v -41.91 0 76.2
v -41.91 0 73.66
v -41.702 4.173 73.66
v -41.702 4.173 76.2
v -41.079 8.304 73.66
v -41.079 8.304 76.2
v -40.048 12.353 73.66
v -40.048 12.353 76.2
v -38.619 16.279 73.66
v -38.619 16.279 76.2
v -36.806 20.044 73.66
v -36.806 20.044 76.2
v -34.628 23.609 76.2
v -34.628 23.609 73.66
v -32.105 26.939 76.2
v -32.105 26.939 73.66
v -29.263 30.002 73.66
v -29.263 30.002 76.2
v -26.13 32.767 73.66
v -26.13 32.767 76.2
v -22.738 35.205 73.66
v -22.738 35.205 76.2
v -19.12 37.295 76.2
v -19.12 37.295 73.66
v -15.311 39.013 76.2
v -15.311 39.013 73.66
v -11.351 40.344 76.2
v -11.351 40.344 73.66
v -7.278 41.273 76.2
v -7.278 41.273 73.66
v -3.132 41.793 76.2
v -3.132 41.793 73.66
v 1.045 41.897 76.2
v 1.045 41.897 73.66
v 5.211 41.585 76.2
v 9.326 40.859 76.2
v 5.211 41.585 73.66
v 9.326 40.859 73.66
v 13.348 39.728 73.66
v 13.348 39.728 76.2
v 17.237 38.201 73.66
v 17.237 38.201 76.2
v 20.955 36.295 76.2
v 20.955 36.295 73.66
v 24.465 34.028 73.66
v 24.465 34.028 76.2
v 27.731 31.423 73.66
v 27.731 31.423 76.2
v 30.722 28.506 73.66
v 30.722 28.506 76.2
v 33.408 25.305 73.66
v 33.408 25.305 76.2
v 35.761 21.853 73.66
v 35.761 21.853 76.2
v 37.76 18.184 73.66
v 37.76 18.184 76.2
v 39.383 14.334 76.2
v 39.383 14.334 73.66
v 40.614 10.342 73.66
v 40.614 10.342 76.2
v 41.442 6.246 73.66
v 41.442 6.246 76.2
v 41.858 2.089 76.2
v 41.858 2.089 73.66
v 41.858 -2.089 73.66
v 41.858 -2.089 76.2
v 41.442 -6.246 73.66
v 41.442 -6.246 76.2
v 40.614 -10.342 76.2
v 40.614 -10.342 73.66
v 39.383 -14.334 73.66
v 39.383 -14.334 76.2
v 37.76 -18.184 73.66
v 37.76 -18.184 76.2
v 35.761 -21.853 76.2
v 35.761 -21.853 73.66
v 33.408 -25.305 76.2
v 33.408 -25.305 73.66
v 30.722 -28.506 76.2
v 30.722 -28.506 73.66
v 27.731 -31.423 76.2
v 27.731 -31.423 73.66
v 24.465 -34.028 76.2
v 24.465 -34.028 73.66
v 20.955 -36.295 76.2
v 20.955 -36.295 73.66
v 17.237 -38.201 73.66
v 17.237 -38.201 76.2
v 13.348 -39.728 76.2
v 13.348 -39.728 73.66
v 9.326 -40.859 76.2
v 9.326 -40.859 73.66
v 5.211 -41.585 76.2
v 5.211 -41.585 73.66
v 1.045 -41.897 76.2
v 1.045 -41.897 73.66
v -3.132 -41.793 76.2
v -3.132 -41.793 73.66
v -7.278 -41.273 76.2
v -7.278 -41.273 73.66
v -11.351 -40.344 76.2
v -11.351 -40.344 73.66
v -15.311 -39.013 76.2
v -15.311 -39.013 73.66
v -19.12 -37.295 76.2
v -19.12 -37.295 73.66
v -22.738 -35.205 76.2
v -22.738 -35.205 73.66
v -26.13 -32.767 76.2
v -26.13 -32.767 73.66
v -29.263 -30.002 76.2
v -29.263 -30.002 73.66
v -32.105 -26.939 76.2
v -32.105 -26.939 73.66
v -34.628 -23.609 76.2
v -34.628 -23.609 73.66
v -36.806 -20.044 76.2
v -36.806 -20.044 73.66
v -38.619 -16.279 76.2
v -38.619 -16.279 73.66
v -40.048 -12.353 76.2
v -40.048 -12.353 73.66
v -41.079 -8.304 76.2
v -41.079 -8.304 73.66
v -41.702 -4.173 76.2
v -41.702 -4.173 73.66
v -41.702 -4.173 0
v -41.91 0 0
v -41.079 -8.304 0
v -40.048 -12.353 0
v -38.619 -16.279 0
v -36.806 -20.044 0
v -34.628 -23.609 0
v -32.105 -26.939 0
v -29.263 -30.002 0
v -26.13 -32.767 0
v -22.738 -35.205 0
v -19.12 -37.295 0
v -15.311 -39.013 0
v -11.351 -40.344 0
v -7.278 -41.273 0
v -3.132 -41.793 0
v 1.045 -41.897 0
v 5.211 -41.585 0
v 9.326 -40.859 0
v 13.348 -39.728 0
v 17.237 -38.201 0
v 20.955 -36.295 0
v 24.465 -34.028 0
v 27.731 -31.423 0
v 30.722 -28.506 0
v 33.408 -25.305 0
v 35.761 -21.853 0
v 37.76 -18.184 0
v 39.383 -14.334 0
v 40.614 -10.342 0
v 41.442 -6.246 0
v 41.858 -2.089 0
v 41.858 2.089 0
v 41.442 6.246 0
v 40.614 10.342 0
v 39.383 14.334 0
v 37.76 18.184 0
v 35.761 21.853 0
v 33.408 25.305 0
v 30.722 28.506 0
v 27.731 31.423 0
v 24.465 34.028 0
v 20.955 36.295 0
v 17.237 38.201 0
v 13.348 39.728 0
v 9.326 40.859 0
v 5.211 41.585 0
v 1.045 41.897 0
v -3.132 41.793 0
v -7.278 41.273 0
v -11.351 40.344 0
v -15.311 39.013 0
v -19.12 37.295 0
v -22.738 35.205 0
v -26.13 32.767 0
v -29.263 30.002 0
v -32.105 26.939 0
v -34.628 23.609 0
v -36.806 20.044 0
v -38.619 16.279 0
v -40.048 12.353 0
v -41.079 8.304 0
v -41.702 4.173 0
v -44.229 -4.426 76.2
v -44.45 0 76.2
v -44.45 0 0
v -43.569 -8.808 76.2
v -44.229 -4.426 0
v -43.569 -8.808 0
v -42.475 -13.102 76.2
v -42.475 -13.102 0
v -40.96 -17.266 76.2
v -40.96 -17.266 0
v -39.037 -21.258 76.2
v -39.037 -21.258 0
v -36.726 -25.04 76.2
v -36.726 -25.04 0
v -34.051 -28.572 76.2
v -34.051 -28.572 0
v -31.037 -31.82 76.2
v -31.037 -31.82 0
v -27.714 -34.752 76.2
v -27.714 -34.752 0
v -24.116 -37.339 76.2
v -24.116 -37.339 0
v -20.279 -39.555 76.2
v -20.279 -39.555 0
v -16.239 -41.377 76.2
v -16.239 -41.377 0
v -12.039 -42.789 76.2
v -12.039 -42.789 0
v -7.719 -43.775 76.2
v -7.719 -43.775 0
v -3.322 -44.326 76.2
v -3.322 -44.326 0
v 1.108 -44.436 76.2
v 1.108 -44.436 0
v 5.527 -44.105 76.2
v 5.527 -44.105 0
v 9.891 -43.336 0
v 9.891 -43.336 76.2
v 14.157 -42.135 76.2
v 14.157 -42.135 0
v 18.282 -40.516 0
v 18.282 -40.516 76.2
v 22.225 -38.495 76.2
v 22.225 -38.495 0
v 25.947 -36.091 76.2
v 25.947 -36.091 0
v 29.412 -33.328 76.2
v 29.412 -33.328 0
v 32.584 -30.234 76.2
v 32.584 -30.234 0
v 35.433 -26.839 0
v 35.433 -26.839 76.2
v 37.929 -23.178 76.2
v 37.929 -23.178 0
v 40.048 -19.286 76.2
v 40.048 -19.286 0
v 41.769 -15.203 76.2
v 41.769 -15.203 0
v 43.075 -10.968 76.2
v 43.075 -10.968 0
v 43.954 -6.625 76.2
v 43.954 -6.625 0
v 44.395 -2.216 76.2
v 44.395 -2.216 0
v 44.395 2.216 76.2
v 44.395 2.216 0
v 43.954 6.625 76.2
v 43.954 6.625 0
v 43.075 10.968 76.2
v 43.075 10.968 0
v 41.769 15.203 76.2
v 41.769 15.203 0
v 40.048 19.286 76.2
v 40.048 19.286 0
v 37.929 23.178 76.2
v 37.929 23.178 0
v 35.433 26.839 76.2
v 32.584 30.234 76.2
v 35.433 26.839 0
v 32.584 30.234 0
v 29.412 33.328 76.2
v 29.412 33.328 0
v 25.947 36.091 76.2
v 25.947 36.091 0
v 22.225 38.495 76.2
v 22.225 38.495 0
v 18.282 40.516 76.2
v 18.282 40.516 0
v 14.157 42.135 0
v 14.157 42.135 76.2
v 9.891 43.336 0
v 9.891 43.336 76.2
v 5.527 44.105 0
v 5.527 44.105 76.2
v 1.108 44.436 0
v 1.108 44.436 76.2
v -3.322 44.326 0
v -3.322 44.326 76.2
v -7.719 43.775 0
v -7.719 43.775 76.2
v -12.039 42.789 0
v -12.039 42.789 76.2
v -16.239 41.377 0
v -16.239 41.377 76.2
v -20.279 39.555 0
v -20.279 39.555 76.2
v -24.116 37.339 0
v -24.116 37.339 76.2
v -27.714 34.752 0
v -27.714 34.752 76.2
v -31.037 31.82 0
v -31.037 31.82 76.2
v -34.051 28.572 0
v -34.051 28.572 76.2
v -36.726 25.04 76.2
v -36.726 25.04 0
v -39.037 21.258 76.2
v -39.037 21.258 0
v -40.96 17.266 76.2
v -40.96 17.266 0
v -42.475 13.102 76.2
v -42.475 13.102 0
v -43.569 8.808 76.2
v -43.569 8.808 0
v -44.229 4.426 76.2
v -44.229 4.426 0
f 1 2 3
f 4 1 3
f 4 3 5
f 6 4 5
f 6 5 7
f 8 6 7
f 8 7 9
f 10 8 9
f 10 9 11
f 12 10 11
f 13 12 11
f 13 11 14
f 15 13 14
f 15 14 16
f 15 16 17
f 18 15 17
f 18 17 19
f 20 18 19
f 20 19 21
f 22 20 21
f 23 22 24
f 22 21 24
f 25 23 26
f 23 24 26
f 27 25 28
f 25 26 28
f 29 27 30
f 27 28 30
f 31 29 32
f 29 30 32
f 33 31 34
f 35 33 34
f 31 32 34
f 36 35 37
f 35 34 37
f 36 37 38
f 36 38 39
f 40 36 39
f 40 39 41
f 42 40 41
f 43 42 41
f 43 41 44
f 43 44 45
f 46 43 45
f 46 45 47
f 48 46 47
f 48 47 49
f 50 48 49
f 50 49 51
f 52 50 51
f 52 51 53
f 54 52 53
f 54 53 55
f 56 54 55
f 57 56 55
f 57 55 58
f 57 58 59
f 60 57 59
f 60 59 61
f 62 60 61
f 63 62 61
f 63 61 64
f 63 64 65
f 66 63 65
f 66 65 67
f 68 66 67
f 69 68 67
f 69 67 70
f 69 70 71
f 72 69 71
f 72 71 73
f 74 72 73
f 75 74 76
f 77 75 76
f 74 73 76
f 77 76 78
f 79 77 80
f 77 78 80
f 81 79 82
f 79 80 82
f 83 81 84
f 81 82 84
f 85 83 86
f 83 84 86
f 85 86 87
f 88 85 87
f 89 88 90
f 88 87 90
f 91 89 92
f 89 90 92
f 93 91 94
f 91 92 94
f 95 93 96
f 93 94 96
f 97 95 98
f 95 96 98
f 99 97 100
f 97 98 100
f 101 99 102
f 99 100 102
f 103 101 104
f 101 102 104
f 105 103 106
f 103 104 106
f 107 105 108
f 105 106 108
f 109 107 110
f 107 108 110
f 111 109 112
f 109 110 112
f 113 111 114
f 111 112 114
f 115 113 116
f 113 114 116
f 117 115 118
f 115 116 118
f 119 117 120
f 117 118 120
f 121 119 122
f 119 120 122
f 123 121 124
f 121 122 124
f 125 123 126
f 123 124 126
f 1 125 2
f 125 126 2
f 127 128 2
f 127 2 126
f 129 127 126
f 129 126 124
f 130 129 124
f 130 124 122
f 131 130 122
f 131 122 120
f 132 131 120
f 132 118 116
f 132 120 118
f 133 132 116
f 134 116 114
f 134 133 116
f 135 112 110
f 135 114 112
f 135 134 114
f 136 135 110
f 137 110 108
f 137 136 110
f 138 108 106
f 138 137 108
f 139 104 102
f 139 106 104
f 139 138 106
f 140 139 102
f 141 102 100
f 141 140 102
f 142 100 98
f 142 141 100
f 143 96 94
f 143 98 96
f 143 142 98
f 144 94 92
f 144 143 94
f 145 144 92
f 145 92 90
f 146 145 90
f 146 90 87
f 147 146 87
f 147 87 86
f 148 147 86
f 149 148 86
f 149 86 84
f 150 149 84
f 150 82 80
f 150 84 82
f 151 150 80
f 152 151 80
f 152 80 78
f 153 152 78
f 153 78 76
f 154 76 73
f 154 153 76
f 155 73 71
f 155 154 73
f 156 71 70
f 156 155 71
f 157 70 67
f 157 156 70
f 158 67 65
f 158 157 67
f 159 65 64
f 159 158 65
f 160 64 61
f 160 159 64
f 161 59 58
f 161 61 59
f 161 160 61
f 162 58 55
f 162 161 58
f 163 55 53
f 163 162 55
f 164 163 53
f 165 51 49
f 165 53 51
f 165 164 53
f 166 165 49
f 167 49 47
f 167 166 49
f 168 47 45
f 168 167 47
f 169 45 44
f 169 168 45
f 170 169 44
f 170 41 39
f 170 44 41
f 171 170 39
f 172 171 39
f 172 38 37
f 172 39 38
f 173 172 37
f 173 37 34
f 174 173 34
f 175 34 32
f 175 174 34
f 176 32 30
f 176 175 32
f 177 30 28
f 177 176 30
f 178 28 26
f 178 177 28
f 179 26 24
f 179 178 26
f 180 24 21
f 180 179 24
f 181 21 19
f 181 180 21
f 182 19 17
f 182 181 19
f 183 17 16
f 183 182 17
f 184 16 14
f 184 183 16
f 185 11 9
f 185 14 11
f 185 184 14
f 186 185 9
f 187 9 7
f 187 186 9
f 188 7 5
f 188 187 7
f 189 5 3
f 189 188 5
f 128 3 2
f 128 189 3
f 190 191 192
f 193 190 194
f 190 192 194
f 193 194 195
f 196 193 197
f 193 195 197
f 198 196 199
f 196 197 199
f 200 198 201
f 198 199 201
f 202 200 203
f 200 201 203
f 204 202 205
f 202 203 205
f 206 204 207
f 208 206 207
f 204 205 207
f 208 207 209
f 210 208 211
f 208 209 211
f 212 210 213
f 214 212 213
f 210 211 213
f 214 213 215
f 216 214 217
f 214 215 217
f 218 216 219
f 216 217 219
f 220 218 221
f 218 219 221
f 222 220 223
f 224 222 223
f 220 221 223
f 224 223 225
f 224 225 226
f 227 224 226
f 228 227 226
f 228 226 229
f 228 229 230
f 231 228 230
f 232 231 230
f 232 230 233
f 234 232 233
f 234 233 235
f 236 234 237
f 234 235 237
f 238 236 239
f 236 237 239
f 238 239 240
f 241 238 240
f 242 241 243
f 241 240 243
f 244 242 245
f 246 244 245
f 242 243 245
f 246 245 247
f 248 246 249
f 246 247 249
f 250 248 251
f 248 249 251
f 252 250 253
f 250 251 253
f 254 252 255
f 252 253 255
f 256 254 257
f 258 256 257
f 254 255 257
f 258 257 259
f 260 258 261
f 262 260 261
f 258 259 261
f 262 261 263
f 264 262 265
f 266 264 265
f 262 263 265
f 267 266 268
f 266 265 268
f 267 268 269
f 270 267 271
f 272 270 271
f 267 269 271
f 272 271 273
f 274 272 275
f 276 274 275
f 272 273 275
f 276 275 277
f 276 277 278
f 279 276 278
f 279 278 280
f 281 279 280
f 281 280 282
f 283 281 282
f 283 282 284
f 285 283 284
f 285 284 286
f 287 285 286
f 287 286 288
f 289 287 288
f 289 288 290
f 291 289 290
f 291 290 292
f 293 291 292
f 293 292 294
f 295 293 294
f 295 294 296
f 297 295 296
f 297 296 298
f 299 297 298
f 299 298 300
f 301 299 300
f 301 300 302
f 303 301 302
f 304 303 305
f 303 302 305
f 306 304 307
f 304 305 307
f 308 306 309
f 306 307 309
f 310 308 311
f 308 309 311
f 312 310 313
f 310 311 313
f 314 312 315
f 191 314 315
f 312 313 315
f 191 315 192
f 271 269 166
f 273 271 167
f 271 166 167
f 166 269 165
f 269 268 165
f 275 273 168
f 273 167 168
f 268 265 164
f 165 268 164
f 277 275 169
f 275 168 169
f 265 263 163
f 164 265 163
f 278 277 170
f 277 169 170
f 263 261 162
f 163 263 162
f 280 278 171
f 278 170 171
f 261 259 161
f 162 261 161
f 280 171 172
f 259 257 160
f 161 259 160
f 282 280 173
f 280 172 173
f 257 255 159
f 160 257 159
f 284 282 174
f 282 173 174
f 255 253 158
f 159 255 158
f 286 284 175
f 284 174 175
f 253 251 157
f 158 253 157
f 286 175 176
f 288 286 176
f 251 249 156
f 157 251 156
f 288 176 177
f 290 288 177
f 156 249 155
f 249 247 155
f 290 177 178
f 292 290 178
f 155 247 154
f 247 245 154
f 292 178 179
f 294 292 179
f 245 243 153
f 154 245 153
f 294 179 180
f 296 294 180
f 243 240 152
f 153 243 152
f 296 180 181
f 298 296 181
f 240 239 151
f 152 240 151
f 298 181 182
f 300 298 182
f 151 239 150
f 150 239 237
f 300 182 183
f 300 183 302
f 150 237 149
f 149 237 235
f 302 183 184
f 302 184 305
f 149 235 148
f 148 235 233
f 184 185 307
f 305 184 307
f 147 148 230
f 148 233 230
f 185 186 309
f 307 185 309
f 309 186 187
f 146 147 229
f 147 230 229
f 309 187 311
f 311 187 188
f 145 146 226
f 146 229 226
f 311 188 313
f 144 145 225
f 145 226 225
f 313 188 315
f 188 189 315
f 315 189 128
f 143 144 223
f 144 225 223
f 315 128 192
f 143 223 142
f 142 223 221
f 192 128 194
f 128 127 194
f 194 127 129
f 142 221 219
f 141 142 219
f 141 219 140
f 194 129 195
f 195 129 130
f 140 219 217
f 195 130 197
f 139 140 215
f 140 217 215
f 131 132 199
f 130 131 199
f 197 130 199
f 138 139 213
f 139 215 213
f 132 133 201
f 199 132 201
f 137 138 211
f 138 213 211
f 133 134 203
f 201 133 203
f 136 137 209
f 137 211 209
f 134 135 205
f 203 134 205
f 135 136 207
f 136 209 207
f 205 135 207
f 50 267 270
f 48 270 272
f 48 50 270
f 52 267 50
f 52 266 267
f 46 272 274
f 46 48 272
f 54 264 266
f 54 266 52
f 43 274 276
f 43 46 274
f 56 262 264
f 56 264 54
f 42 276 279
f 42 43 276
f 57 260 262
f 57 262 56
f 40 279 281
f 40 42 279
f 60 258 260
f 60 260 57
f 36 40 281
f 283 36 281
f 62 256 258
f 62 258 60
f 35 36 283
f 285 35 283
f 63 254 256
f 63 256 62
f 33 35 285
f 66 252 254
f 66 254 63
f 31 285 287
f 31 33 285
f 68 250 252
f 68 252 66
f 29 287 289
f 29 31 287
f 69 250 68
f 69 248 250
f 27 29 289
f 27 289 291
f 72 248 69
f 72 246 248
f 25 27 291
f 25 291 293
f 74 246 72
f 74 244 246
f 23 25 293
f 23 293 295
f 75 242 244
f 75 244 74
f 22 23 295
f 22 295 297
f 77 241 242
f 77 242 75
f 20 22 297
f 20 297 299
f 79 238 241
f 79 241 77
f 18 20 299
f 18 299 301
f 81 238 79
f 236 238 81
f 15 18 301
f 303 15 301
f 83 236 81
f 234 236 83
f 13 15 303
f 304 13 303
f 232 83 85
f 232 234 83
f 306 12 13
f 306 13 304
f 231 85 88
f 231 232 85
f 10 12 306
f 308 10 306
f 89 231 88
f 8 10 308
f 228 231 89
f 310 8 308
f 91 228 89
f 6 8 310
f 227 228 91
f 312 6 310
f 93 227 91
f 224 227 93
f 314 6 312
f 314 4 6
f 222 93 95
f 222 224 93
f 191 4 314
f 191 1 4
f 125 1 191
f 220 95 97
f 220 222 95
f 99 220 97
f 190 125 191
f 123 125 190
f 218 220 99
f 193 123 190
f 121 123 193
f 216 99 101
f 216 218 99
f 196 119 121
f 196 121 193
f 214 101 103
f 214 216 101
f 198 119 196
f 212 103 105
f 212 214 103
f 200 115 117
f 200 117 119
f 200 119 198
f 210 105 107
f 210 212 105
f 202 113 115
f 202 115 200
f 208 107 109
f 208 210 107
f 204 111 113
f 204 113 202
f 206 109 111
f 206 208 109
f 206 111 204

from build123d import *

# Parameters (mm, degrees)
SKETCH2_R           = 44.45
BOSS_EXTRUDE1_DEPTH = 76.2
SHELL1_T            = -2.54
SKETCH3_R           = 41.91
CUT_EXTRUDE1_DEPTH  = 76.2


with BuildPart() as part:
    # Sketch2 → Boss-Extrude1 (new body)
    with BuildSketch(Plane.XY):
        with Locations(Location((0, 0, 0), (0, 0, 180))):
            Circle(SKETCH2_R)
    extrude(amount=BOSS_EXTRUDE1_DEPTH)

    # Shell1
    shell1_openings = [part.faces().sort_by_distance(p)[0] for p in [
        (0, 0, 0),
    ]]
    offset(amount=SHELL1_T, openings=shell1_openings, kind=Kind.INTERSECTION)

    # Sketch3 → Cut-Extrude1 (cut)
    with BuildSketch(Plane(origin=(0, 0, 73.66), x_dir=(-1, 0, 0), z_dir=(0, 0, -1))):
        Circle(SKETCH3_R)
    extrude(amount=-CUT_EXTRUDE1_DEPTH, mode=Mode.SUBTRACT)


solid = part.part
